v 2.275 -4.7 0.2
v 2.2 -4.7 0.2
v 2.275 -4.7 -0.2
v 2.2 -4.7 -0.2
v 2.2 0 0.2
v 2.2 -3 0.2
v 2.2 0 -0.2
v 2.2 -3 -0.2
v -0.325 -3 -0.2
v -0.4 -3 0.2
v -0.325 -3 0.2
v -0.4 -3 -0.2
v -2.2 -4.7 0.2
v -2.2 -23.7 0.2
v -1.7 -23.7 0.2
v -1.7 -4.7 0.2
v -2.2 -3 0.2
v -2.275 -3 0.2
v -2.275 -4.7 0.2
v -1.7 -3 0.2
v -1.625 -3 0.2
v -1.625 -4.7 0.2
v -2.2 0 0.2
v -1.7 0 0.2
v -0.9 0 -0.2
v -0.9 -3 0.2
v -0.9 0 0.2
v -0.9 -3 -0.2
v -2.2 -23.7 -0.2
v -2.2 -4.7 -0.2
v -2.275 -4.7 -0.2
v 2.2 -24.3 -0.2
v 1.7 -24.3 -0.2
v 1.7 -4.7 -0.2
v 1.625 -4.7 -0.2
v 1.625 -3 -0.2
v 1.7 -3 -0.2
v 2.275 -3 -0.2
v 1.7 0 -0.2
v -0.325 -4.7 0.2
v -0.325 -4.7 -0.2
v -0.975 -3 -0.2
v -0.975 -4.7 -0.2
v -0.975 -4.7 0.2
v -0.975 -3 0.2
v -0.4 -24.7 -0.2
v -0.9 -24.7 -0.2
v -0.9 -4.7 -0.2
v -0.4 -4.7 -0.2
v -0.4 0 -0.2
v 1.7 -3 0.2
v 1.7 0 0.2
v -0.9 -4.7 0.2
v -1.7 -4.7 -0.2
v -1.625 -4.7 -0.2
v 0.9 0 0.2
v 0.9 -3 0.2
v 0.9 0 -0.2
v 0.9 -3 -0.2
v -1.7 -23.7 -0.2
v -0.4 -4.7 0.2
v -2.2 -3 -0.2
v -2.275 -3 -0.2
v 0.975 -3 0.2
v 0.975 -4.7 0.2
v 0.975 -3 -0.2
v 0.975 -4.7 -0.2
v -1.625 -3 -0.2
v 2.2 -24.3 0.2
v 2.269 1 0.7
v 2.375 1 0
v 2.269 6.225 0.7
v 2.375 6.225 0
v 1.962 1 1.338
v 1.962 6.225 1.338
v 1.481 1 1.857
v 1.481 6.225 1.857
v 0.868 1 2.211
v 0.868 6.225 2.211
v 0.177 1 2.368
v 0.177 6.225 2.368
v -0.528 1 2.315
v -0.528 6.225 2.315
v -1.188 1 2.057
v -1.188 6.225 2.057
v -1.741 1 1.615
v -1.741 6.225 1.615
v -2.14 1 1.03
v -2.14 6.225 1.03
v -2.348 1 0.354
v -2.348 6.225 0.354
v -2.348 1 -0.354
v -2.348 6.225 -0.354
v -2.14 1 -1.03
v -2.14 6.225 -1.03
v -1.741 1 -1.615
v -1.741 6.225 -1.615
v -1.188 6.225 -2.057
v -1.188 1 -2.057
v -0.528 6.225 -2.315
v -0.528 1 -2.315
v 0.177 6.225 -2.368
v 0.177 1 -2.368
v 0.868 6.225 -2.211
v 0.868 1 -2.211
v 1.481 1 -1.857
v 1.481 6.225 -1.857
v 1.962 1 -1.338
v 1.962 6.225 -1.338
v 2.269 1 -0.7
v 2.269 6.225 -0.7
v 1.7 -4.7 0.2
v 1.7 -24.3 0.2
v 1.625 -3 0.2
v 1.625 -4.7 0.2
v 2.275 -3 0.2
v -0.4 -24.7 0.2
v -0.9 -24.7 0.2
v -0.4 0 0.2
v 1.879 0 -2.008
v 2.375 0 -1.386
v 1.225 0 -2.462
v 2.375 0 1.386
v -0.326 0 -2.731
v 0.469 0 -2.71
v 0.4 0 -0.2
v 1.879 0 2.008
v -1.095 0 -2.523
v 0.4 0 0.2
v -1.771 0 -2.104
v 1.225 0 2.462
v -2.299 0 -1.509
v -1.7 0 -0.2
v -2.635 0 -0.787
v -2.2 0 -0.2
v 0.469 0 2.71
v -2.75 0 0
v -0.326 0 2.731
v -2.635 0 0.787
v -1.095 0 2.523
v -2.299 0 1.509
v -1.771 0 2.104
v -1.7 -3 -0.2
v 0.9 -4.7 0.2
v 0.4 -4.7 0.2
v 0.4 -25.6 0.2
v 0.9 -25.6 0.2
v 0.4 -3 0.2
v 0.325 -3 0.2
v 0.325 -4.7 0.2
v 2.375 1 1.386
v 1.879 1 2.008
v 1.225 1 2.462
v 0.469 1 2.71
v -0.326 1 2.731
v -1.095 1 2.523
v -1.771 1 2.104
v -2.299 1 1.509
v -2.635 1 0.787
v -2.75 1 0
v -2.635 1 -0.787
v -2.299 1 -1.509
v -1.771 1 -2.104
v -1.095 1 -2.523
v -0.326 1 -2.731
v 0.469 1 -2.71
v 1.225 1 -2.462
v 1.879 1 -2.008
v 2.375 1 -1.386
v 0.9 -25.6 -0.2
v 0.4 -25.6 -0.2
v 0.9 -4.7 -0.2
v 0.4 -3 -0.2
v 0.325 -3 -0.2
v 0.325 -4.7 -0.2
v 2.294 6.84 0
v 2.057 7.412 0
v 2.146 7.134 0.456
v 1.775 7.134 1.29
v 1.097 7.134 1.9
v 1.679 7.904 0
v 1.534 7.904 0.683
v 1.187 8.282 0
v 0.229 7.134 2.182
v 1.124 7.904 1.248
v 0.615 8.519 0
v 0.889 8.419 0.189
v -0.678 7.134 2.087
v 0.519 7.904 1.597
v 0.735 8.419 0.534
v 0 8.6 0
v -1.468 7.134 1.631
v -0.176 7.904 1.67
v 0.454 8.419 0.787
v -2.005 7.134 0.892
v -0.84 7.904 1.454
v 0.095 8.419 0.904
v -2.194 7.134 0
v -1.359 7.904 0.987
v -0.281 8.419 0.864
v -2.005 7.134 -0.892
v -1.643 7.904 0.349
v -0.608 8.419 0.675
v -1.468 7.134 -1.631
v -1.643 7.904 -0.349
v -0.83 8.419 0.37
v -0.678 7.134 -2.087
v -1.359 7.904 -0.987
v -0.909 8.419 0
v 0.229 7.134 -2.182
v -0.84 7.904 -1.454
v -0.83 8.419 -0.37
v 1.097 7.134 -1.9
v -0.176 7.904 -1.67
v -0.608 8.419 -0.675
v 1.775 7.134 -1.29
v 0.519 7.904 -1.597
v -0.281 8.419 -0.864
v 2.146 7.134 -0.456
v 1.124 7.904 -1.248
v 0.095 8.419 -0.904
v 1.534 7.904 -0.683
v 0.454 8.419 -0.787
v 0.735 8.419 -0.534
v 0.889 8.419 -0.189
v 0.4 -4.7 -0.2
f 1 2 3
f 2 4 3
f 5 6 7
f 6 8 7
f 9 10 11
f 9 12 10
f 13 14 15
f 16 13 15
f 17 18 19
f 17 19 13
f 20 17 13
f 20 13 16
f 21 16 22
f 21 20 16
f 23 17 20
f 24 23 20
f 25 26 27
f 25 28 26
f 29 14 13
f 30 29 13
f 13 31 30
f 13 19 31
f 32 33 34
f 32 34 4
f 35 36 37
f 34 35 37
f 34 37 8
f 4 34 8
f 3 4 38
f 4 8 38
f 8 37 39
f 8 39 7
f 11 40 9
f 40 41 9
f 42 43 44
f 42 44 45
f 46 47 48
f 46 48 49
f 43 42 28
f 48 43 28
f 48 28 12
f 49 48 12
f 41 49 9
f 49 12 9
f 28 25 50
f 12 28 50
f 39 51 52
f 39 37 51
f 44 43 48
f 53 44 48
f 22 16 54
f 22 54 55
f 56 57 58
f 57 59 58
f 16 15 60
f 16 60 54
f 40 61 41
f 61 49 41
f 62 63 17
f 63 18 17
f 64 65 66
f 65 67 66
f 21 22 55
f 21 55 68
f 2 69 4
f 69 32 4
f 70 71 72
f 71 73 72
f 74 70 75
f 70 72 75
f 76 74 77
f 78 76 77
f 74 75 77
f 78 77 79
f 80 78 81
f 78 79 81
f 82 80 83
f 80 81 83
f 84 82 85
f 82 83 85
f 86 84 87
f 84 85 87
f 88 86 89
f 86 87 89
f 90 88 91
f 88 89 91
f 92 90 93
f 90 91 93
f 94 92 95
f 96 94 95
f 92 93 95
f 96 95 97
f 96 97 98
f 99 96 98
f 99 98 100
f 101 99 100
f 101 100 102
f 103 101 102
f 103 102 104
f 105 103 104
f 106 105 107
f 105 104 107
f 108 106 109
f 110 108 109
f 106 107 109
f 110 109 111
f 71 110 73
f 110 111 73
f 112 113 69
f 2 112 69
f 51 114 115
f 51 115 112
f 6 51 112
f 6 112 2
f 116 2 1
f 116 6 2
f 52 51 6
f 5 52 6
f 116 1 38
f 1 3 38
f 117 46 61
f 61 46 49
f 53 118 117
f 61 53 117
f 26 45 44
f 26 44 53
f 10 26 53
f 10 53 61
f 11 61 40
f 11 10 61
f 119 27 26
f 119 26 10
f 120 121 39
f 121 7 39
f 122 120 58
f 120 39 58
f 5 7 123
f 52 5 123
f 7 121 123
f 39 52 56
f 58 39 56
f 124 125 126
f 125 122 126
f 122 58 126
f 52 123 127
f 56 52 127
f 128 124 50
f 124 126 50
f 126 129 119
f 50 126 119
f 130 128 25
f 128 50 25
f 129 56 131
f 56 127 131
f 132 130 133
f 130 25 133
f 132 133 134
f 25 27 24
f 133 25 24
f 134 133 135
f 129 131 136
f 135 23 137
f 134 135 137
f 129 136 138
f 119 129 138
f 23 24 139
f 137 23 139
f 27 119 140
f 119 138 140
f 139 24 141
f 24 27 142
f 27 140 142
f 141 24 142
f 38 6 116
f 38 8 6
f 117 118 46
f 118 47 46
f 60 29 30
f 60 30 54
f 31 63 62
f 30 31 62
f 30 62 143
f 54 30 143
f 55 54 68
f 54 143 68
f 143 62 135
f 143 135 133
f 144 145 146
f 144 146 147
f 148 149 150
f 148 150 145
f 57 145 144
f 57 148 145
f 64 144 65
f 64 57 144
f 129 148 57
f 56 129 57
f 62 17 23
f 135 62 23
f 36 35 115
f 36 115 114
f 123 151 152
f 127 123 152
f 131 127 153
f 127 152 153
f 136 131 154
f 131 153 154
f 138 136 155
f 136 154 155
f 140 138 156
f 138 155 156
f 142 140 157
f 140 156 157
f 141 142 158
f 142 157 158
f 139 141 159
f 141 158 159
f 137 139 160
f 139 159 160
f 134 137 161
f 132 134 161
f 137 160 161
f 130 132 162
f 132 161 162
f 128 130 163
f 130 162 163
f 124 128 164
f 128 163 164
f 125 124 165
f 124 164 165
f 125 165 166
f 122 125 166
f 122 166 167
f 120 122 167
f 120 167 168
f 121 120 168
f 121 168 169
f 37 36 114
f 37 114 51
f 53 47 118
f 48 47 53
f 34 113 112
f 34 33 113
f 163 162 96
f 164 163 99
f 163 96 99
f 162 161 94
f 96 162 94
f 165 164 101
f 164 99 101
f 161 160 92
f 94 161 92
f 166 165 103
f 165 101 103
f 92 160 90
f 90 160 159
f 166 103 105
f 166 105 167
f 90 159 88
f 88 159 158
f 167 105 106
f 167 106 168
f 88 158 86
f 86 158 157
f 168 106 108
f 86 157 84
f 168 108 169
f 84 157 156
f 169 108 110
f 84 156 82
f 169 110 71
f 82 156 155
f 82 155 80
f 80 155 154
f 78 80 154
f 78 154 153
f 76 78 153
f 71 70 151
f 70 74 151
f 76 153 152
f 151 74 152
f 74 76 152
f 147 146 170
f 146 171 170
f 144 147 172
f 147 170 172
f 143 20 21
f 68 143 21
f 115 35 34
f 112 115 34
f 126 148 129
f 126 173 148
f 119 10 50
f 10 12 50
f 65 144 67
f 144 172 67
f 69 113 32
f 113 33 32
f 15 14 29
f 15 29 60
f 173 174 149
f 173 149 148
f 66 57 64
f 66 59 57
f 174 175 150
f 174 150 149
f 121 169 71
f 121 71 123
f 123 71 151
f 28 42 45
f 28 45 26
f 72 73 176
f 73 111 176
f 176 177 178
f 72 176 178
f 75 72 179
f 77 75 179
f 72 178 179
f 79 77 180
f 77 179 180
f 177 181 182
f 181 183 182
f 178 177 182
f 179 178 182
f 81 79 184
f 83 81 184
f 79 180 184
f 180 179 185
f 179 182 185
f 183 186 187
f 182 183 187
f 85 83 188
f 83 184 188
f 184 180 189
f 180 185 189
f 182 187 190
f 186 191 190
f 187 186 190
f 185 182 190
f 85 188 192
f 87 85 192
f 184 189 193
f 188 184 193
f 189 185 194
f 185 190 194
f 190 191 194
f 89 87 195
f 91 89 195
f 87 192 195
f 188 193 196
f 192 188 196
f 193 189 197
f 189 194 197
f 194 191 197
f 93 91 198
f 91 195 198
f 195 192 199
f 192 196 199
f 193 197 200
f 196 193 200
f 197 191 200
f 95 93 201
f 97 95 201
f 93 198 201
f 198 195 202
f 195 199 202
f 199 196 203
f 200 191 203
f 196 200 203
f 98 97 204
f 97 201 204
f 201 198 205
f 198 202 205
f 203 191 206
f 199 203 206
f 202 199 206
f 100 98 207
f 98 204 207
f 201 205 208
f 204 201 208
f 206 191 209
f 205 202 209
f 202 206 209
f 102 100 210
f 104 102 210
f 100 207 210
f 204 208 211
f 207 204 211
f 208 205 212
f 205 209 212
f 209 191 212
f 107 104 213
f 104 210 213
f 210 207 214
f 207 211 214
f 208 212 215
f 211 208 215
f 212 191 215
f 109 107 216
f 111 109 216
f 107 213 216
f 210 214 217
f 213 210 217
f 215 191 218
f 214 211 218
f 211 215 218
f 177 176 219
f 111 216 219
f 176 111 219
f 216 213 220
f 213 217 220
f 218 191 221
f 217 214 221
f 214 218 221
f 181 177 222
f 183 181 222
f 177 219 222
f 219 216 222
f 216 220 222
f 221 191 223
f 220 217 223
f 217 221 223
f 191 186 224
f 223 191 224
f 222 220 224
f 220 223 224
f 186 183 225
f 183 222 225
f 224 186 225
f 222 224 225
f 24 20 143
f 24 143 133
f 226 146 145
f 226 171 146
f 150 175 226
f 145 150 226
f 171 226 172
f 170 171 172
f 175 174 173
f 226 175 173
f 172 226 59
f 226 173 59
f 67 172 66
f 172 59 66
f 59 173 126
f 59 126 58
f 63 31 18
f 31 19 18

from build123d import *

# Parameters (mm, degrees)
SKETCH2_W           = 0.5
SKETCH2_H           = 24.3
SKETCH2_H_2         = 25.6
SKETCH2_H_3         = 24.7
SKETCH2_H_4         = 23.7
SKETCH2_W_2         = 0.65
SKETCH2_H_5         = 1.7
BOSS_EXTRUDE1_DEPTH = 0.2
CUT_EXTRUDE1_DEPTH  = 27.6


with BuildPart() as part:
    # Sketch1 → Revolve1 (revolve)
    with BuildSketch(Plane.XY):
        with BuildLine():
            Line((0, 0), (2.75, 0))
            Line((2.75, 0), (2.75, 1))
            Line((2.75, 1), (2.375, 1))
            Line((2.375, 1), (2.375, 6.225))
            ThreePointArc((2.375, 6.225), (1.679378605, 7.904378605), (0, 8.6))
            Line((0, 8.6), (0, 0))
        make_face()
    revolve(axis=Axis((0, 0, 0), (0, -1, 0)))

    # Sketch2 → Boss-Extrude1 (add, symmetric)
    with BuildSketch(Plane.XY):
        with Locations((1.95, -12.15)):
            Rectangle(SKETCH2_W, SKETCH2_H)
        with Locations((0.65, -12.8)):
            Rectangle(SKETCH2_W, SKETCH2_H_2)
        with Locations((-0.65, -12.35)):
            Rectangle(SKETCH2_W, SKETCH2_H_3)
        with Locations((-1.95, -11.85)):
            Rectangle(SKETCH2_W, SKETCH2_H_4)
        with Locations((-1.95, -3.85)):
            Rectangle(SKETCH2_W_2, SKETCH2_H_5)
        with Locations((-0.65, -3.85)):
            Rectangle(SKETCH2_W_2, SKETCH2_H_5)
        with Locations((0.65, -3.85)):
            Rectangle(SKETCH2_W_2, SKETCH2_H_5)
        with Locations((1.95, -3.85)):
            Rectangle(SKETCH2_W_2, SKETCH2_H_5)
    extrude(amount=BOSS_EXTRUDE1_DEPTH, both=True)

    # Sketch3 → Cut-Extrude1 (cut, through all)
    with BuildSketch(Plane(origin=(0, 1, 0), x_dir=(1, 0, 0), z_dir=(0, 1, 0))):
        Polygon((2.375, 24.558218042), (2.375, 1.386317063), (2.375, -1.386317063), (2.375, -24.558218042), (48.718801957, -24.558218042), (48.718801957, 24.558218042), align=None)
    extrude(amount=-CUT_EXTRUDE1_DEPTH, mode=Mode.SUBTRACT)


solid = part.part
